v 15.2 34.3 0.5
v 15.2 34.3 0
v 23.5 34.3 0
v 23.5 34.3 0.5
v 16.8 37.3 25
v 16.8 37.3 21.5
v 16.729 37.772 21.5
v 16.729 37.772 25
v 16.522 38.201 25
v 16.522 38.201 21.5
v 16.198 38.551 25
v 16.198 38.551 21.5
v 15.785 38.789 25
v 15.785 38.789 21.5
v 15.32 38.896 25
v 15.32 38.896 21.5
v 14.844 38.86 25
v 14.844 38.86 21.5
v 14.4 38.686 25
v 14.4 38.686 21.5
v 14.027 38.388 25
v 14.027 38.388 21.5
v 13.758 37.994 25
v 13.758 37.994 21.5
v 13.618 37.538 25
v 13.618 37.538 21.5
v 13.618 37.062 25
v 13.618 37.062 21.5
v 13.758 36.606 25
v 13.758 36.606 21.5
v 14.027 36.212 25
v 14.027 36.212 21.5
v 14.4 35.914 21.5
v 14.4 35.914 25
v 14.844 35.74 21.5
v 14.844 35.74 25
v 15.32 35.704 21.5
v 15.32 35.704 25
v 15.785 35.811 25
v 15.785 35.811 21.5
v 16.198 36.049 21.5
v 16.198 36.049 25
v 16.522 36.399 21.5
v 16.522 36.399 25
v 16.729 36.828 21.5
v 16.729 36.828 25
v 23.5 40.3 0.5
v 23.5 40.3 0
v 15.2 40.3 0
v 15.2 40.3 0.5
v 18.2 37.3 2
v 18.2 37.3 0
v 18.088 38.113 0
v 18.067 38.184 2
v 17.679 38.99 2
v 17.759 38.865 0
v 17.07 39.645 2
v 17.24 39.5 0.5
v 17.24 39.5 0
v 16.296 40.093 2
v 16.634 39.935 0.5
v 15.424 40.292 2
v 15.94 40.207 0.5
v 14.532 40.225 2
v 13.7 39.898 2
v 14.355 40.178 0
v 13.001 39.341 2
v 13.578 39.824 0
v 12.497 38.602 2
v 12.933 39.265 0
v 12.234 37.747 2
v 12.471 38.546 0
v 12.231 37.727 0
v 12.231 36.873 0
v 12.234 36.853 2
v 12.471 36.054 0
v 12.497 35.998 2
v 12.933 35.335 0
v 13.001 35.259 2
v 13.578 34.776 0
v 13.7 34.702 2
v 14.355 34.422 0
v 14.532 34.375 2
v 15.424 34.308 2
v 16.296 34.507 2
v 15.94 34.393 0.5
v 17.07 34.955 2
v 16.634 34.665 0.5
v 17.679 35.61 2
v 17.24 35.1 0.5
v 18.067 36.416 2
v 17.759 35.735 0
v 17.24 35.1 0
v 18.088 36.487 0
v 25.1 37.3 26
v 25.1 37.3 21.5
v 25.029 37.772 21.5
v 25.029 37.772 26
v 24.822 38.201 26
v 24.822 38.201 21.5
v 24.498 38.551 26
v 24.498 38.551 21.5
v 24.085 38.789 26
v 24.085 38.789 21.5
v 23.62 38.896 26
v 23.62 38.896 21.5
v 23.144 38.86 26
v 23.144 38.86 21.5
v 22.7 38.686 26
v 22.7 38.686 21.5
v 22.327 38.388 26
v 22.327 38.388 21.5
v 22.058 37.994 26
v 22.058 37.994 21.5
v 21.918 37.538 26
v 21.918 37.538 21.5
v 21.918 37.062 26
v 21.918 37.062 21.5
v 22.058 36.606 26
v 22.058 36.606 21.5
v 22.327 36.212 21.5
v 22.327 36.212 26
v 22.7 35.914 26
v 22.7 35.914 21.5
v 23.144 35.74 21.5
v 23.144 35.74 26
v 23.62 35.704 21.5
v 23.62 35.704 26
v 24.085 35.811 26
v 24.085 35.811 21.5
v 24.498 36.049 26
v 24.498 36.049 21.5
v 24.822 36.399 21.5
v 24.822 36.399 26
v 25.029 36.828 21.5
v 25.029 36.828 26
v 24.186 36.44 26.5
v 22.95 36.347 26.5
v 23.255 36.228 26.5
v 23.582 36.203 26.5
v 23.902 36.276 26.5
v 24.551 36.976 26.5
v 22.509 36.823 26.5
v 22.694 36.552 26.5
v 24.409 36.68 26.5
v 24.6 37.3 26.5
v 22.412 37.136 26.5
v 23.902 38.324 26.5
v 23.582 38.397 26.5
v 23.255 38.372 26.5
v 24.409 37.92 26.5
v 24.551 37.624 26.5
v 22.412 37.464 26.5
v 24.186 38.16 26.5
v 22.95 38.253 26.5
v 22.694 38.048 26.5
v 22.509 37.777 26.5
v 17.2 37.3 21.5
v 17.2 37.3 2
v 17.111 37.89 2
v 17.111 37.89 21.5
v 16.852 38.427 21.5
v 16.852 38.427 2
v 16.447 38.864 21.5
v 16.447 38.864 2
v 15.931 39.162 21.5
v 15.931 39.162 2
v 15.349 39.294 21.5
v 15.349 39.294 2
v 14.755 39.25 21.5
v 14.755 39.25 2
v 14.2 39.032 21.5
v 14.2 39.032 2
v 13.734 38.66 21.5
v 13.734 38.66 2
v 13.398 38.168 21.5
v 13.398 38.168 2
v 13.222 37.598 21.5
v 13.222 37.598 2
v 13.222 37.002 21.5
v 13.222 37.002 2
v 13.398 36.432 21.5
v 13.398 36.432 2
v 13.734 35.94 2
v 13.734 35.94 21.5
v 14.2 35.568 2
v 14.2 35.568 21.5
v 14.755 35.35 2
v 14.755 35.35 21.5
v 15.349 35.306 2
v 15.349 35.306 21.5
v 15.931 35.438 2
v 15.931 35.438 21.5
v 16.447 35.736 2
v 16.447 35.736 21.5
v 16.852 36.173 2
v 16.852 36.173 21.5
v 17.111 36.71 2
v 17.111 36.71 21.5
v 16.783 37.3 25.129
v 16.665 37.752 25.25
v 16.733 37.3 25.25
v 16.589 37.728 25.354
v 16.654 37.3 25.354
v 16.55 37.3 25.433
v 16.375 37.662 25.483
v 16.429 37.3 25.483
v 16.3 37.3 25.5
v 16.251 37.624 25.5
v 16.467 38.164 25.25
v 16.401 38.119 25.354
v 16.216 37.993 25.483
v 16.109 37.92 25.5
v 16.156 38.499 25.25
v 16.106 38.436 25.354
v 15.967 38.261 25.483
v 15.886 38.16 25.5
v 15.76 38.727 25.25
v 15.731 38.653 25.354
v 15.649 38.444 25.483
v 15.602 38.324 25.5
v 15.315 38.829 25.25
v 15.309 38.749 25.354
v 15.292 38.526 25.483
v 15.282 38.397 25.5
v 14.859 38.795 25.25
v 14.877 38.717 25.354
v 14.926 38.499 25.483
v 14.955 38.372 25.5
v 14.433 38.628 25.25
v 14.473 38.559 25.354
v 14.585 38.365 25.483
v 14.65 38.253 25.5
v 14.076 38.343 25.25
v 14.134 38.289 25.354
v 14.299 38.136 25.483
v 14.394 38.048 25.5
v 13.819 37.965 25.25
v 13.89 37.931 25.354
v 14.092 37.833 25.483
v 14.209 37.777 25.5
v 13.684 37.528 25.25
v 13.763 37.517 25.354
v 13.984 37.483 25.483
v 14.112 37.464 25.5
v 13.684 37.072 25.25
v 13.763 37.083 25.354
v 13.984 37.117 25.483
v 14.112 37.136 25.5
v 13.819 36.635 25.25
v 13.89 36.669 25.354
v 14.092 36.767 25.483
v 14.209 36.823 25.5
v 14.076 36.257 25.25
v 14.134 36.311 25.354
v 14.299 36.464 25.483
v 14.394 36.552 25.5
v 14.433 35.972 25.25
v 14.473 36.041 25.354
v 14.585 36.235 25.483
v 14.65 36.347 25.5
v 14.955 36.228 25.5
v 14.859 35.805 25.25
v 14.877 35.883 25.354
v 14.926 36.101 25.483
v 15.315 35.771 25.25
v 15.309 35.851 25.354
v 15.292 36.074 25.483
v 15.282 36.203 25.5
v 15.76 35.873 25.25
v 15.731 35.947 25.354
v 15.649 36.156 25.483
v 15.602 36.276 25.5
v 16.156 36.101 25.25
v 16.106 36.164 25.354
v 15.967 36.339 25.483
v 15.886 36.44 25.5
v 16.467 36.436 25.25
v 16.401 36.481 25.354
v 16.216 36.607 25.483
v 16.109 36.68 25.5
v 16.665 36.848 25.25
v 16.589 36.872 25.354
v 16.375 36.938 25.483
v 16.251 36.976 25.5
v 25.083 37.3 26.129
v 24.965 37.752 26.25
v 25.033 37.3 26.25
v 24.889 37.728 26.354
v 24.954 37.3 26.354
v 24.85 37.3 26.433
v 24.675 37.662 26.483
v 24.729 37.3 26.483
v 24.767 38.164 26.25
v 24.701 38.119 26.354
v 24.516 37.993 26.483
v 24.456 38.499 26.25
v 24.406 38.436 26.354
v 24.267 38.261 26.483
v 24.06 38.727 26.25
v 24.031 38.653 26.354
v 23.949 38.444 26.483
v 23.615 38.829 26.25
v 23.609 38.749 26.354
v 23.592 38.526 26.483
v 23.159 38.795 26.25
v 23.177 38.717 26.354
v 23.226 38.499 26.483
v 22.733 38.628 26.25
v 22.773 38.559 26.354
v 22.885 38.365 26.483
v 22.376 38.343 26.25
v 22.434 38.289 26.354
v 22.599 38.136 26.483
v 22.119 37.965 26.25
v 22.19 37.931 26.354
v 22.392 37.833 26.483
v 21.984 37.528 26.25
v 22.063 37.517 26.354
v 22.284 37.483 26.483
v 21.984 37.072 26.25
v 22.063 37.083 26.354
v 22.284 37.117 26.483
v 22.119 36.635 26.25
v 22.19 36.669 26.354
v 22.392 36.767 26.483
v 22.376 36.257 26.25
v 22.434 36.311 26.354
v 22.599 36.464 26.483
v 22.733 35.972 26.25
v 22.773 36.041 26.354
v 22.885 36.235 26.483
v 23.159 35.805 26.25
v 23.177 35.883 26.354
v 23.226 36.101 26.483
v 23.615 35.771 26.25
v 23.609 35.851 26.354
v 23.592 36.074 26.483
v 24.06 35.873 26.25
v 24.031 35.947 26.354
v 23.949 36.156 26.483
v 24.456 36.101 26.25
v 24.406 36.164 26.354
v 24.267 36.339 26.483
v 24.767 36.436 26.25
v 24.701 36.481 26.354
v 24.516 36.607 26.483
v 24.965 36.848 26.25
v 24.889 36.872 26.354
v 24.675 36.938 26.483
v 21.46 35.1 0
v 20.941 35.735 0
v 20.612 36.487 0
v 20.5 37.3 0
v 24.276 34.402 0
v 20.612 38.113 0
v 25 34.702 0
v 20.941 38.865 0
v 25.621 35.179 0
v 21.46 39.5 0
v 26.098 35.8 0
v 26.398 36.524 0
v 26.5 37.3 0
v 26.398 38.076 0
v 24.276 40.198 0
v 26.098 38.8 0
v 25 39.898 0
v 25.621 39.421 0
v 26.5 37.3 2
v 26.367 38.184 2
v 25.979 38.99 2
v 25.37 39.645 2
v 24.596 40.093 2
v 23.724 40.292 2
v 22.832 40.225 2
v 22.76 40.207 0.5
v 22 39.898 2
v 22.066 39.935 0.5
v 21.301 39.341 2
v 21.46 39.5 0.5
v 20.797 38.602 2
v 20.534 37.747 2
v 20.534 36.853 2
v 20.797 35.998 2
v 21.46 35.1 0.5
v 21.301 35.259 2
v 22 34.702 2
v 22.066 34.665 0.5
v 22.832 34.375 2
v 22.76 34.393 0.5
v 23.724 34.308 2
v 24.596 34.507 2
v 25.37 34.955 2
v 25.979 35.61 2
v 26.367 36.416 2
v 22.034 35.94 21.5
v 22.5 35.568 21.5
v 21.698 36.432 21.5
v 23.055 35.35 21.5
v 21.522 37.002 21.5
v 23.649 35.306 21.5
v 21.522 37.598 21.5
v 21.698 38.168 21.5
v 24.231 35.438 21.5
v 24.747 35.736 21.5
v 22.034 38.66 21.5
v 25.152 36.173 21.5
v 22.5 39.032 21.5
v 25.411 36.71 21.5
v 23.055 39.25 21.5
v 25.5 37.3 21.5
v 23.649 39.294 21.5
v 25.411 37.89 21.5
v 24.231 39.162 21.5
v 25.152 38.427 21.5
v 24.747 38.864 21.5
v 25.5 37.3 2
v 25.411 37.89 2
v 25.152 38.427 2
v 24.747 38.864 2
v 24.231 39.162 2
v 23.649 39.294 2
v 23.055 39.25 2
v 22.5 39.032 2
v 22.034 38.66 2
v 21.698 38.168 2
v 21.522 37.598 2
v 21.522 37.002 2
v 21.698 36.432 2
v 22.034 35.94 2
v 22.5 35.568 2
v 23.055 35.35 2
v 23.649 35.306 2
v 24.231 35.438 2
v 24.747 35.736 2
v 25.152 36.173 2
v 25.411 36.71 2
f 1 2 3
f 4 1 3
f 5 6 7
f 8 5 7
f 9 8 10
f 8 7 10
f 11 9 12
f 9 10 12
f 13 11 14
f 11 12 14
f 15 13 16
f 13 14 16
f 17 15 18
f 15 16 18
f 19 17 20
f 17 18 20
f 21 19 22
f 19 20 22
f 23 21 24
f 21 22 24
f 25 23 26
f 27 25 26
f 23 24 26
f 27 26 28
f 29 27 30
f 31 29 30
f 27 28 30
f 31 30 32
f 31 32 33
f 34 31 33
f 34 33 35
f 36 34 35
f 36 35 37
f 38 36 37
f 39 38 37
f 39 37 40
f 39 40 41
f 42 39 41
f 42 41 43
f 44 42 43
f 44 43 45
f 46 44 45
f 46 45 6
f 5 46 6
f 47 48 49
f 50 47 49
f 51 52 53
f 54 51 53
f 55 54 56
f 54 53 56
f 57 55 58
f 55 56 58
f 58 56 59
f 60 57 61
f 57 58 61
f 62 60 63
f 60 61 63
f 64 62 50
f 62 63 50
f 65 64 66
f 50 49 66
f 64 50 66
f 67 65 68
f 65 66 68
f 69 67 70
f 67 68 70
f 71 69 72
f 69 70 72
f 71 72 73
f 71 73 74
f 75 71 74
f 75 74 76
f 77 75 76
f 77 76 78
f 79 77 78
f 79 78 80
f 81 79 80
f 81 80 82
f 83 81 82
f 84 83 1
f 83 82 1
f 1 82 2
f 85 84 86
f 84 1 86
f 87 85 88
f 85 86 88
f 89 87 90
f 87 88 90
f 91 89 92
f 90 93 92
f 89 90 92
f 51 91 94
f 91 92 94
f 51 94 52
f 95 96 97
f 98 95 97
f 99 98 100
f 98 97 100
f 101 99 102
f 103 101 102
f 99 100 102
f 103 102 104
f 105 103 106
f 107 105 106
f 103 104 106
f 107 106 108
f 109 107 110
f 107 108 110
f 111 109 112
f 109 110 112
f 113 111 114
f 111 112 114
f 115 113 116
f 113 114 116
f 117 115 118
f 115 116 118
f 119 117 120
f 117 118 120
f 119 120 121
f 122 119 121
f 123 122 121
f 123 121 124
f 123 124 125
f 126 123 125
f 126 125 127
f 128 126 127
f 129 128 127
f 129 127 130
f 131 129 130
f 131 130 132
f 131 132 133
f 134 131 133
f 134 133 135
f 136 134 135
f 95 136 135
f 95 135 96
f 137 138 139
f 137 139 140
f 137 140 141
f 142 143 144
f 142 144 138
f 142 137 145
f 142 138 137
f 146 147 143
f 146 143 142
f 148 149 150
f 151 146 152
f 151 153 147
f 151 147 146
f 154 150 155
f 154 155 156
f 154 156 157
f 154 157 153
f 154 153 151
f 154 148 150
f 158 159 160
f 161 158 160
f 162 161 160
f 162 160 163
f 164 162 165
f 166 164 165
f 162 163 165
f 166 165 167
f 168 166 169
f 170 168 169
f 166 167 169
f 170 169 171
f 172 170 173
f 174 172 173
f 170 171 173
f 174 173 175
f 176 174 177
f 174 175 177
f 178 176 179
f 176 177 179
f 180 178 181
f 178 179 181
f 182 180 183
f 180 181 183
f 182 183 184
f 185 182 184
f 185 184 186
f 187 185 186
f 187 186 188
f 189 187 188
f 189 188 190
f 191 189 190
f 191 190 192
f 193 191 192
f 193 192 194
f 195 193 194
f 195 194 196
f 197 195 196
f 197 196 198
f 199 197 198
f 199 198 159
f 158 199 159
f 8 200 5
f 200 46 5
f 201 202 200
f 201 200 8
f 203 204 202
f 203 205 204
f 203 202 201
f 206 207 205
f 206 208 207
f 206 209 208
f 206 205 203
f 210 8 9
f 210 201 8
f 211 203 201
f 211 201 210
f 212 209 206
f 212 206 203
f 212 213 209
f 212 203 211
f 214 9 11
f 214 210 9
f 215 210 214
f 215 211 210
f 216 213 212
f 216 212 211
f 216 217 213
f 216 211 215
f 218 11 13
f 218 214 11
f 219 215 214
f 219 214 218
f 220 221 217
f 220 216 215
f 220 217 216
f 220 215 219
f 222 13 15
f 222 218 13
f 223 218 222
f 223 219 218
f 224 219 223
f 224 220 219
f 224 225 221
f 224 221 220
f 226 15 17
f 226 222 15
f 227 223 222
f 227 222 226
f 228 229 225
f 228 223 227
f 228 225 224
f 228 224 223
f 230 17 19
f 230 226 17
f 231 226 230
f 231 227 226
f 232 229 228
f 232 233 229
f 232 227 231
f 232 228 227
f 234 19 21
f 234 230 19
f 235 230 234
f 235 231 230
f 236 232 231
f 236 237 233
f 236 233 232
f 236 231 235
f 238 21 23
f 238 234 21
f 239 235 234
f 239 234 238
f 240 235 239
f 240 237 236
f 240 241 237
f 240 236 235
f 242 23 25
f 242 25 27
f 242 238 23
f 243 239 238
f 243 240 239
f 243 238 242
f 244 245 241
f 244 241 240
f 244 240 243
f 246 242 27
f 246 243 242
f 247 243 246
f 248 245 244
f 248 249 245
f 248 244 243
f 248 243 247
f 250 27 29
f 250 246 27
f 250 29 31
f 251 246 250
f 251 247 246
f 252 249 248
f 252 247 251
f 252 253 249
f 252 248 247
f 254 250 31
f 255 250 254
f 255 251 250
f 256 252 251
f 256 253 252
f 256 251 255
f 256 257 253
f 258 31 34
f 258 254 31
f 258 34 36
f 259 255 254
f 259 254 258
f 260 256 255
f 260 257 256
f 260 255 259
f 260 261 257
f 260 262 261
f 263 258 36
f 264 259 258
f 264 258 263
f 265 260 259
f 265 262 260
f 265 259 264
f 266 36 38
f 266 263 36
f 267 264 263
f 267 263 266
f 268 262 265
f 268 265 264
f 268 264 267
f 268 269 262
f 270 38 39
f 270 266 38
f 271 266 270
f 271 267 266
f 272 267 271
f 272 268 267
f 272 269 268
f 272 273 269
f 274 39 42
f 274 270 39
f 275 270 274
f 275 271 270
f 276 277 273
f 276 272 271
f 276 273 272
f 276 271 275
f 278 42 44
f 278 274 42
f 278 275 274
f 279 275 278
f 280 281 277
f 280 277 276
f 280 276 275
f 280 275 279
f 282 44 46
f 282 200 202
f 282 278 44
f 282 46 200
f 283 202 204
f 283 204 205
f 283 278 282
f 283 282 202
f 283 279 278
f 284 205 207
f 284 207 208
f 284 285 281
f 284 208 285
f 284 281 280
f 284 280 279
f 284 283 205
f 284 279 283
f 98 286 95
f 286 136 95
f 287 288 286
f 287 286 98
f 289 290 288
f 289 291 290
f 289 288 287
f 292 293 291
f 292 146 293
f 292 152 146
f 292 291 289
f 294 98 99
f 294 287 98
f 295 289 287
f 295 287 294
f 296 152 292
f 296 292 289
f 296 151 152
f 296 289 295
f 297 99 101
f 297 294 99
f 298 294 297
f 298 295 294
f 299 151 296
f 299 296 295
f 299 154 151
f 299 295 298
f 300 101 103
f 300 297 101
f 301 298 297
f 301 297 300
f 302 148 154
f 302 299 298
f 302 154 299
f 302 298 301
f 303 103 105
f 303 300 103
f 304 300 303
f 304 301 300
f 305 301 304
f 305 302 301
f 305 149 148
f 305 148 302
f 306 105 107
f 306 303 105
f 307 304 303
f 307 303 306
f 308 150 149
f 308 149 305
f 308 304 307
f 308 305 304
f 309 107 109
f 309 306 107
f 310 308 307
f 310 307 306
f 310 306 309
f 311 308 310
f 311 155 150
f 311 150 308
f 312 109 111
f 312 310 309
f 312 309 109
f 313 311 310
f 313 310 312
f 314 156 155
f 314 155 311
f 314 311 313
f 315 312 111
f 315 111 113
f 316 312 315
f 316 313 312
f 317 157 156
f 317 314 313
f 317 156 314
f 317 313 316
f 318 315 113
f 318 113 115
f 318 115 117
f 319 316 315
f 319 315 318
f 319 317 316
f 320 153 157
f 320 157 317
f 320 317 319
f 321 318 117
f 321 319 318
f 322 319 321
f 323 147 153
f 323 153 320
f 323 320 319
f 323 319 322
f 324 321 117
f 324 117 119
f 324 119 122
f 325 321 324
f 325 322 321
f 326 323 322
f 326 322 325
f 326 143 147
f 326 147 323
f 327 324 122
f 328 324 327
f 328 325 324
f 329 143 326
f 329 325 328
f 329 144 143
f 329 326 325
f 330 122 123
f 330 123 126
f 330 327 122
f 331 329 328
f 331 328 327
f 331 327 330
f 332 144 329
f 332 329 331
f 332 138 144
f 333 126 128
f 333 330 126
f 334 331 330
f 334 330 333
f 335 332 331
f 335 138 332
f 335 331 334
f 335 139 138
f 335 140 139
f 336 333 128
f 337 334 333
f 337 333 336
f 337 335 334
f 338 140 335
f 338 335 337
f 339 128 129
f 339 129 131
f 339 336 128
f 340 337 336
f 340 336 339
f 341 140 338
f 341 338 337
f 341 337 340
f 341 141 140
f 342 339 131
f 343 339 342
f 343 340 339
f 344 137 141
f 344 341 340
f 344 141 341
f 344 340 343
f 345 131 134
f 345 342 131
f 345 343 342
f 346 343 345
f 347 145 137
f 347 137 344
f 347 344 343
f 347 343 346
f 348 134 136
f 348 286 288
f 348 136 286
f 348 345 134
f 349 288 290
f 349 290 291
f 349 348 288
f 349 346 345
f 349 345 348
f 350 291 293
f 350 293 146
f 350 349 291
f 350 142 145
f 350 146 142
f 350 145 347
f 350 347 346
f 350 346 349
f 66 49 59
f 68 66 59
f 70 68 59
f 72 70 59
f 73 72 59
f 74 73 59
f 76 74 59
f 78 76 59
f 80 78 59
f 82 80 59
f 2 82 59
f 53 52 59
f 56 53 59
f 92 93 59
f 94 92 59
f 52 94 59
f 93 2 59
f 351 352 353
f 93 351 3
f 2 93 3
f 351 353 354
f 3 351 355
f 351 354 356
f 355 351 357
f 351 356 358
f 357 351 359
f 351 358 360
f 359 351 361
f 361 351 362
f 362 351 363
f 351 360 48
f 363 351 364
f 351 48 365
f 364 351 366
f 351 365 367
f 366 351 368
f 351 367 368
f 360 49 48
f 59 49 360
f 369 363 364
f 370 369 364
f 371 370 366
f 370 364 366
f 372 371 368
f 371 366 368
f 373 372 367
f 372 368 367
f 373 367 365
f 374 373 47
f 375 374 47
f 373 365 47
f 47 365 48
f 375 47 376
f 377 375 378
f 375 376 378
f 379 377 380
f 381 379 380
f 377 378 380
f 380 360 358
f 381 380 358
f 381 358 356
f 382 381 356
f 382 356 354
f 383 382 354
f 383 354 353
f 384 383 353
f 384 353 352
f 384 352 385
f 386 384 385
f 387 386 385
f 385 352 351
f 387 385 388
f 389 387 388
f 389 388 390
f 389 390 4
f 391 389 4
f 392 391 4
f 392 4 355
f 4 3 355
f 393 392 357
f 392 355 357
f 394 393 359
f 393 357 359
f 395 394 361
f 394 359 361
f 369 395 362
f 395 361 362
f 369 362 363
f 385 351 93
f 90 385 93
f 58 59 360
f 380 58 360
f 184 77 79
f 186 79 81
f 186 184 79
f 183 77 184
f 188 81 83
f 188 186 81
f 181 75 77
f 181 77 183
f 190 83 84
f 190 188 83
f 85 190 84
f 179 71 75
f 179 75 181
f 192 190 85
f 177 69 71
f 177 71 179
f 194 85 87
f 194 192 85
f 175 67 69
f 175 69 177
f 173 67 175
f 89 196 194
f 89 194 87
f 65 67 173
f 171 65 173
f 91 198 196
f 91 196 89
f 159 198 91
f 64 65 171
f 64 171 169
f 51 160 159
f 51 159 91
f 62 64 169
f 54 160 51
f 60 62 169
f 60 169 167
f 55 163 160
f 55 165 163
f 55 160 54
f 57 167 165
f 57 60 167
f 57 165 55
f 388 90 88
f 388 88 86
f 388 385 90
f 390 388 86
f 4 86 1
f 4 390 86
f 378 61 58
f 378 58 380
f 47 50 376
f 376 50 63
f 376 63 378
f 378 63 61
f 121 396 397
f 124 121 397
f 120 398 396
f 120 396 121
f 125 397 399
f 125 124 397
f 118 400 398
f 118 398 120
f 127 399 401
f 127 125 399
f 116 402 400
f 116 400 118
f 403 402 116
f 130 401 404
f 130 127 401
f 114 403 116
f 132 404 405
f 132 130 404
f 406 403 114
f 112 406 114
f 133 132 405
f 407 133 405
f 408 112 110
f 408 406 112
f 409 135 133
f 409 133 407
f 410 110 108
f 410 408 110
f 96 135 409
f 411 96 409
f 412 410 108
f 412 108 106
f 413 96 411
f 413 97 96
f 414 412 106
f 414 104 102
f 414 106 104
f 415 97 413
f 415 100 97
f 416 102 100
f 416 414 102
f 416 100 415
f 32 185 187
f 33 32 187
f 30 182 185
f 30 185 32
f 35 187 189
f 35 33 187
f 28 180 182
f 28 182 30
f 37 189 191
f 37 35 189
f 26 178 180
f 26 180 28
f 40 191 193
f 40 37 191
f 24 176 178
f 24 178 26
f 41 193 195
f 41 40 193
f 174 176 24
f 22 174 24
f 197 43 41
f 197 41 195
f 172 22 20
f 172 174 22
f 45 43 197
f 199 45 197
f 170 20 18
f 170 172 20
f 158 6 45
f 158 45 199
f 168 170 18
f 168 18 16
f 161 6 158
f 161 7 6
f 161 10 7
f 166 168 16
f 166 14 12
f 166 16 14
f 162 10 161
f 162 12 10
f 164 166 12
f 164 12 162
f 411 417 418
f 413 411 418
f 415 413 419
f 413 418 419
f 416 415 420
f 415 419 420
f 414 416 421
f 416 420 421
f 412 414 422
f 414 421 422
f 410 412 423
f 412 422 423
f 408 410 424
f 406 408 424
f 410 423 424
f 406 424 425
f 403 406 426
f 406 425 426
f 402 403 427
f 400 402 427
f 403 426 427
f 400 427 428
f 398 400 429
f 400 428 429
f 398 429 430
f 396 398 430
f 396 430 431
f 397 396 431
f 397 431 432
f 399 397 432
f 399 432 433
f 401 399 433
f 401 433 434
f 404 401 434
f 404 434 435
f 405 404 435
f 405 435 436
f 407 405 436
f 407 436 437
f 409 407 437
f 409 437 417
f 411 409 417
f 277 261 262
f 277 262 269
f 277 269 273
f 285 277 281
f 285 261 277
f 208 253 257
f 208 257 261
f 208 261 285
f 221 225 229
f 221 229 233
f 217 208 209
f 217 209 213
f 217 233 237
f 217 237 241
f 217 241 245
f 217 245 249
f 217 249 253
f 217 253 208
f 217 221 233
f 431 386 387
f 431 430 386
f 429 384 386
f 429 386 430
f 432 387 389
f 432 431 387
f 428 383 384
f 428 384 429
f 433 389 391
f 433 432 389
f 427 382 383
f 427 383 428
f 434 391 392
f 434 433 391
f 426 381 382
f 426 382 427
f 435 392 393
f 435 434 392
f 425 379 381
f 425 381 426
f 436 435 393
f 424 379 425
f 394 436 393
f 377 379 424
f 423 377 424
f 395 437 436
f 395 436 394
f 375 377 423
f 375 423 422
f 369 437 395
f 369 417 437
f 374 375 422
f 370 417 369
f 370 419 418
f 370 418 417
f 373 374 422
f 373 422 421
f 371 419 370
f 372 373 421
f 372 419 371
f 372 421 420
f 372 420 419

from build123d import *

# Parameters (mm, degrees)
SKETCH_2_R        = 2
SKETCH_2_R_2      = 1.6
EXTRUDE_3_DEPTH   = 21.5
EXTRUDE_3_2_DEPTH = 21.5
SKETCH_2_8_R      = 1.6
EXTRUDE_4_DEPTH   = 26.5
SKETCH_2_9_R      = 3
SKETCH_2_9_R_2    = 2
EXTRUDE_5_DEPTH   = 2
EXTRUDE_7_DEPTH   = 0.5
FILLET_1_R        = 0.5
SKETCH_2_12_R     = 1.6
EXTRUDE_8_DEPTH   = 25.5
FILLET_3_R        = 0.5


with BuildPart() as part:
    # 草图2 → 凸台-拉伸3 (new body)
    with BuildSketch(Plane.XY):
        with Locations((23.5, 37.3)):
            Circle(SKETCH_2_R)
        with Locations((23.5, 37.3)):
            Circle(SKETCH_2_R_2, mode=Mode.SUBTRACT)
    extrude(amount=EXTRUDE_3_DEPTH)

    # 草图2<8> → 凸台-拉伸4 (add)
    with BuildSketch(Plane.XY):
        with Locations((23.5, 37.3)):
            Circle(SKETCH_2_8_R)
    extrude(amount=EXTRUDE_4_DEPTH)

    # 草图2<9> → 凸台-拉伸5 (add)
    # profile 1 of 2: a face of its own
    with BuildSketch(Plane.XY):
        with Locations((15.2, 37.3)):
            Circle(SKETCH_2_9_R)
        with Locations((15.2, 37.3)):
            Circle(SKETCH_2_9_R_2, mode=Mode.SUBTRACT)
    # profile 2 of 2: a face of its own
    with BuildSketch(Plane.XY):
        with Locations((23.5, 37.3)):
            Circle(SKETCH_2_9_R)
        with Locations((23.5, 37.3)):
            Circle(SKETCH_2_9_R_2, mode=Mode.SUBTRACT)
    extrude(amount=EXTRUDE_5_DEPTH)


with BuildPart() as body_2:
    # 草图2 → Extrude 3 2 (new body)
    with BuildSketch(Plane.XY):
        with Locations((15.2, 37.3)):
            Circle(SKETCH_2_R)
        with Locations((15.2, 37.3)):
            Circle(SKETCH_2_R_2, mode=Mode.SUBTRACT)
    extrude(amount=EXTRUDE_3_2_DEPTH)


with BuildPart() as extrude_5_piece_1:
    # of the separate pieces the step leaves, piece 1, a body of its own (extrude_5_pieces)
    add(part.part.solids().sort_by_distance((25.5, 37.3, 2))[0])

    # 草图2<11> → 凸台-拉伸7 (add)
    with BuildSketch(Plane.XY):
        with BuildLine():
            ThreePointArc((17.239607805, 35.1), (16.295445115, 34.507151991), (15.2, 34.3))
            Line((15.2, 34.3), (23.5, 34.3))
            ThreePointArc((23.5, 34.3), (22.404554885, 34.507151991), (21.460392195, 35.1))
            Line((21.460392195, 35.1), (17.239607805, 35.1))
        make_face()
        with BuildLine():
            Line((23.5, 40.3), (15.2, 40.3))
            ThreePointArc((15.2, 40.3), (16.295445115, 40.092848009), (17.239607805, 39.5))
            Line((17.239607805, 39.5), (21.460392195, 39.5))
            ThreePointArc((21.460392195, 39.5), (22.404554885, 40.092848009), (23.5, 40.3))
        make_face()
    extrude(amount=EXTRUDE_7_DEPTH)

    # 圆角1
    fillet_1_edges = [extrude_5_piece_1.edges().sort_by_distance(p)[0] for p in [
        (21.9, 37.3, 26.5),
    ]]
    fillet(fillet_1_edges, radius=FILLET_1_R)



with BuildPart() as extrude_5_piece_2:
    # of the separate pieces the step leaves, piece 2, a body of its own (extrude_5_pieces)
    add(part.part.solids().sort_by_distance((18.2, 37.3, 0))[0])


with BuildPart() as extrude_5_piece_1_1:
    add(extrude_5_piece_1.part)

    add(extrude_5_piece_2.part)  # 凸台-拉伸8 merges 凸台-拉伸5 piece 2

    add(body_2.part)  # 凸台-拉伸8 merges body 2
    # 草图2<12> → 凸台-拉伸8 (add)
    with BuildSketch(Plane.XY):
        with Locations((15.2, 37.3)):
            Circle(SKETCH_2_12_R)
    extrude(amount=EXTRUDE_8_DEPTH)

    # 圆角3
    fillet_3_edges = [extrude_5_piece_1_1.edges().sort_by_distance(p)[0] for p in [
        (13.6, 37.3, 25.5),
    ]]
    fillet(fillet_3_edges, radius=FILLET_3_R)


solid = extrude_5_piece_1_1.part
